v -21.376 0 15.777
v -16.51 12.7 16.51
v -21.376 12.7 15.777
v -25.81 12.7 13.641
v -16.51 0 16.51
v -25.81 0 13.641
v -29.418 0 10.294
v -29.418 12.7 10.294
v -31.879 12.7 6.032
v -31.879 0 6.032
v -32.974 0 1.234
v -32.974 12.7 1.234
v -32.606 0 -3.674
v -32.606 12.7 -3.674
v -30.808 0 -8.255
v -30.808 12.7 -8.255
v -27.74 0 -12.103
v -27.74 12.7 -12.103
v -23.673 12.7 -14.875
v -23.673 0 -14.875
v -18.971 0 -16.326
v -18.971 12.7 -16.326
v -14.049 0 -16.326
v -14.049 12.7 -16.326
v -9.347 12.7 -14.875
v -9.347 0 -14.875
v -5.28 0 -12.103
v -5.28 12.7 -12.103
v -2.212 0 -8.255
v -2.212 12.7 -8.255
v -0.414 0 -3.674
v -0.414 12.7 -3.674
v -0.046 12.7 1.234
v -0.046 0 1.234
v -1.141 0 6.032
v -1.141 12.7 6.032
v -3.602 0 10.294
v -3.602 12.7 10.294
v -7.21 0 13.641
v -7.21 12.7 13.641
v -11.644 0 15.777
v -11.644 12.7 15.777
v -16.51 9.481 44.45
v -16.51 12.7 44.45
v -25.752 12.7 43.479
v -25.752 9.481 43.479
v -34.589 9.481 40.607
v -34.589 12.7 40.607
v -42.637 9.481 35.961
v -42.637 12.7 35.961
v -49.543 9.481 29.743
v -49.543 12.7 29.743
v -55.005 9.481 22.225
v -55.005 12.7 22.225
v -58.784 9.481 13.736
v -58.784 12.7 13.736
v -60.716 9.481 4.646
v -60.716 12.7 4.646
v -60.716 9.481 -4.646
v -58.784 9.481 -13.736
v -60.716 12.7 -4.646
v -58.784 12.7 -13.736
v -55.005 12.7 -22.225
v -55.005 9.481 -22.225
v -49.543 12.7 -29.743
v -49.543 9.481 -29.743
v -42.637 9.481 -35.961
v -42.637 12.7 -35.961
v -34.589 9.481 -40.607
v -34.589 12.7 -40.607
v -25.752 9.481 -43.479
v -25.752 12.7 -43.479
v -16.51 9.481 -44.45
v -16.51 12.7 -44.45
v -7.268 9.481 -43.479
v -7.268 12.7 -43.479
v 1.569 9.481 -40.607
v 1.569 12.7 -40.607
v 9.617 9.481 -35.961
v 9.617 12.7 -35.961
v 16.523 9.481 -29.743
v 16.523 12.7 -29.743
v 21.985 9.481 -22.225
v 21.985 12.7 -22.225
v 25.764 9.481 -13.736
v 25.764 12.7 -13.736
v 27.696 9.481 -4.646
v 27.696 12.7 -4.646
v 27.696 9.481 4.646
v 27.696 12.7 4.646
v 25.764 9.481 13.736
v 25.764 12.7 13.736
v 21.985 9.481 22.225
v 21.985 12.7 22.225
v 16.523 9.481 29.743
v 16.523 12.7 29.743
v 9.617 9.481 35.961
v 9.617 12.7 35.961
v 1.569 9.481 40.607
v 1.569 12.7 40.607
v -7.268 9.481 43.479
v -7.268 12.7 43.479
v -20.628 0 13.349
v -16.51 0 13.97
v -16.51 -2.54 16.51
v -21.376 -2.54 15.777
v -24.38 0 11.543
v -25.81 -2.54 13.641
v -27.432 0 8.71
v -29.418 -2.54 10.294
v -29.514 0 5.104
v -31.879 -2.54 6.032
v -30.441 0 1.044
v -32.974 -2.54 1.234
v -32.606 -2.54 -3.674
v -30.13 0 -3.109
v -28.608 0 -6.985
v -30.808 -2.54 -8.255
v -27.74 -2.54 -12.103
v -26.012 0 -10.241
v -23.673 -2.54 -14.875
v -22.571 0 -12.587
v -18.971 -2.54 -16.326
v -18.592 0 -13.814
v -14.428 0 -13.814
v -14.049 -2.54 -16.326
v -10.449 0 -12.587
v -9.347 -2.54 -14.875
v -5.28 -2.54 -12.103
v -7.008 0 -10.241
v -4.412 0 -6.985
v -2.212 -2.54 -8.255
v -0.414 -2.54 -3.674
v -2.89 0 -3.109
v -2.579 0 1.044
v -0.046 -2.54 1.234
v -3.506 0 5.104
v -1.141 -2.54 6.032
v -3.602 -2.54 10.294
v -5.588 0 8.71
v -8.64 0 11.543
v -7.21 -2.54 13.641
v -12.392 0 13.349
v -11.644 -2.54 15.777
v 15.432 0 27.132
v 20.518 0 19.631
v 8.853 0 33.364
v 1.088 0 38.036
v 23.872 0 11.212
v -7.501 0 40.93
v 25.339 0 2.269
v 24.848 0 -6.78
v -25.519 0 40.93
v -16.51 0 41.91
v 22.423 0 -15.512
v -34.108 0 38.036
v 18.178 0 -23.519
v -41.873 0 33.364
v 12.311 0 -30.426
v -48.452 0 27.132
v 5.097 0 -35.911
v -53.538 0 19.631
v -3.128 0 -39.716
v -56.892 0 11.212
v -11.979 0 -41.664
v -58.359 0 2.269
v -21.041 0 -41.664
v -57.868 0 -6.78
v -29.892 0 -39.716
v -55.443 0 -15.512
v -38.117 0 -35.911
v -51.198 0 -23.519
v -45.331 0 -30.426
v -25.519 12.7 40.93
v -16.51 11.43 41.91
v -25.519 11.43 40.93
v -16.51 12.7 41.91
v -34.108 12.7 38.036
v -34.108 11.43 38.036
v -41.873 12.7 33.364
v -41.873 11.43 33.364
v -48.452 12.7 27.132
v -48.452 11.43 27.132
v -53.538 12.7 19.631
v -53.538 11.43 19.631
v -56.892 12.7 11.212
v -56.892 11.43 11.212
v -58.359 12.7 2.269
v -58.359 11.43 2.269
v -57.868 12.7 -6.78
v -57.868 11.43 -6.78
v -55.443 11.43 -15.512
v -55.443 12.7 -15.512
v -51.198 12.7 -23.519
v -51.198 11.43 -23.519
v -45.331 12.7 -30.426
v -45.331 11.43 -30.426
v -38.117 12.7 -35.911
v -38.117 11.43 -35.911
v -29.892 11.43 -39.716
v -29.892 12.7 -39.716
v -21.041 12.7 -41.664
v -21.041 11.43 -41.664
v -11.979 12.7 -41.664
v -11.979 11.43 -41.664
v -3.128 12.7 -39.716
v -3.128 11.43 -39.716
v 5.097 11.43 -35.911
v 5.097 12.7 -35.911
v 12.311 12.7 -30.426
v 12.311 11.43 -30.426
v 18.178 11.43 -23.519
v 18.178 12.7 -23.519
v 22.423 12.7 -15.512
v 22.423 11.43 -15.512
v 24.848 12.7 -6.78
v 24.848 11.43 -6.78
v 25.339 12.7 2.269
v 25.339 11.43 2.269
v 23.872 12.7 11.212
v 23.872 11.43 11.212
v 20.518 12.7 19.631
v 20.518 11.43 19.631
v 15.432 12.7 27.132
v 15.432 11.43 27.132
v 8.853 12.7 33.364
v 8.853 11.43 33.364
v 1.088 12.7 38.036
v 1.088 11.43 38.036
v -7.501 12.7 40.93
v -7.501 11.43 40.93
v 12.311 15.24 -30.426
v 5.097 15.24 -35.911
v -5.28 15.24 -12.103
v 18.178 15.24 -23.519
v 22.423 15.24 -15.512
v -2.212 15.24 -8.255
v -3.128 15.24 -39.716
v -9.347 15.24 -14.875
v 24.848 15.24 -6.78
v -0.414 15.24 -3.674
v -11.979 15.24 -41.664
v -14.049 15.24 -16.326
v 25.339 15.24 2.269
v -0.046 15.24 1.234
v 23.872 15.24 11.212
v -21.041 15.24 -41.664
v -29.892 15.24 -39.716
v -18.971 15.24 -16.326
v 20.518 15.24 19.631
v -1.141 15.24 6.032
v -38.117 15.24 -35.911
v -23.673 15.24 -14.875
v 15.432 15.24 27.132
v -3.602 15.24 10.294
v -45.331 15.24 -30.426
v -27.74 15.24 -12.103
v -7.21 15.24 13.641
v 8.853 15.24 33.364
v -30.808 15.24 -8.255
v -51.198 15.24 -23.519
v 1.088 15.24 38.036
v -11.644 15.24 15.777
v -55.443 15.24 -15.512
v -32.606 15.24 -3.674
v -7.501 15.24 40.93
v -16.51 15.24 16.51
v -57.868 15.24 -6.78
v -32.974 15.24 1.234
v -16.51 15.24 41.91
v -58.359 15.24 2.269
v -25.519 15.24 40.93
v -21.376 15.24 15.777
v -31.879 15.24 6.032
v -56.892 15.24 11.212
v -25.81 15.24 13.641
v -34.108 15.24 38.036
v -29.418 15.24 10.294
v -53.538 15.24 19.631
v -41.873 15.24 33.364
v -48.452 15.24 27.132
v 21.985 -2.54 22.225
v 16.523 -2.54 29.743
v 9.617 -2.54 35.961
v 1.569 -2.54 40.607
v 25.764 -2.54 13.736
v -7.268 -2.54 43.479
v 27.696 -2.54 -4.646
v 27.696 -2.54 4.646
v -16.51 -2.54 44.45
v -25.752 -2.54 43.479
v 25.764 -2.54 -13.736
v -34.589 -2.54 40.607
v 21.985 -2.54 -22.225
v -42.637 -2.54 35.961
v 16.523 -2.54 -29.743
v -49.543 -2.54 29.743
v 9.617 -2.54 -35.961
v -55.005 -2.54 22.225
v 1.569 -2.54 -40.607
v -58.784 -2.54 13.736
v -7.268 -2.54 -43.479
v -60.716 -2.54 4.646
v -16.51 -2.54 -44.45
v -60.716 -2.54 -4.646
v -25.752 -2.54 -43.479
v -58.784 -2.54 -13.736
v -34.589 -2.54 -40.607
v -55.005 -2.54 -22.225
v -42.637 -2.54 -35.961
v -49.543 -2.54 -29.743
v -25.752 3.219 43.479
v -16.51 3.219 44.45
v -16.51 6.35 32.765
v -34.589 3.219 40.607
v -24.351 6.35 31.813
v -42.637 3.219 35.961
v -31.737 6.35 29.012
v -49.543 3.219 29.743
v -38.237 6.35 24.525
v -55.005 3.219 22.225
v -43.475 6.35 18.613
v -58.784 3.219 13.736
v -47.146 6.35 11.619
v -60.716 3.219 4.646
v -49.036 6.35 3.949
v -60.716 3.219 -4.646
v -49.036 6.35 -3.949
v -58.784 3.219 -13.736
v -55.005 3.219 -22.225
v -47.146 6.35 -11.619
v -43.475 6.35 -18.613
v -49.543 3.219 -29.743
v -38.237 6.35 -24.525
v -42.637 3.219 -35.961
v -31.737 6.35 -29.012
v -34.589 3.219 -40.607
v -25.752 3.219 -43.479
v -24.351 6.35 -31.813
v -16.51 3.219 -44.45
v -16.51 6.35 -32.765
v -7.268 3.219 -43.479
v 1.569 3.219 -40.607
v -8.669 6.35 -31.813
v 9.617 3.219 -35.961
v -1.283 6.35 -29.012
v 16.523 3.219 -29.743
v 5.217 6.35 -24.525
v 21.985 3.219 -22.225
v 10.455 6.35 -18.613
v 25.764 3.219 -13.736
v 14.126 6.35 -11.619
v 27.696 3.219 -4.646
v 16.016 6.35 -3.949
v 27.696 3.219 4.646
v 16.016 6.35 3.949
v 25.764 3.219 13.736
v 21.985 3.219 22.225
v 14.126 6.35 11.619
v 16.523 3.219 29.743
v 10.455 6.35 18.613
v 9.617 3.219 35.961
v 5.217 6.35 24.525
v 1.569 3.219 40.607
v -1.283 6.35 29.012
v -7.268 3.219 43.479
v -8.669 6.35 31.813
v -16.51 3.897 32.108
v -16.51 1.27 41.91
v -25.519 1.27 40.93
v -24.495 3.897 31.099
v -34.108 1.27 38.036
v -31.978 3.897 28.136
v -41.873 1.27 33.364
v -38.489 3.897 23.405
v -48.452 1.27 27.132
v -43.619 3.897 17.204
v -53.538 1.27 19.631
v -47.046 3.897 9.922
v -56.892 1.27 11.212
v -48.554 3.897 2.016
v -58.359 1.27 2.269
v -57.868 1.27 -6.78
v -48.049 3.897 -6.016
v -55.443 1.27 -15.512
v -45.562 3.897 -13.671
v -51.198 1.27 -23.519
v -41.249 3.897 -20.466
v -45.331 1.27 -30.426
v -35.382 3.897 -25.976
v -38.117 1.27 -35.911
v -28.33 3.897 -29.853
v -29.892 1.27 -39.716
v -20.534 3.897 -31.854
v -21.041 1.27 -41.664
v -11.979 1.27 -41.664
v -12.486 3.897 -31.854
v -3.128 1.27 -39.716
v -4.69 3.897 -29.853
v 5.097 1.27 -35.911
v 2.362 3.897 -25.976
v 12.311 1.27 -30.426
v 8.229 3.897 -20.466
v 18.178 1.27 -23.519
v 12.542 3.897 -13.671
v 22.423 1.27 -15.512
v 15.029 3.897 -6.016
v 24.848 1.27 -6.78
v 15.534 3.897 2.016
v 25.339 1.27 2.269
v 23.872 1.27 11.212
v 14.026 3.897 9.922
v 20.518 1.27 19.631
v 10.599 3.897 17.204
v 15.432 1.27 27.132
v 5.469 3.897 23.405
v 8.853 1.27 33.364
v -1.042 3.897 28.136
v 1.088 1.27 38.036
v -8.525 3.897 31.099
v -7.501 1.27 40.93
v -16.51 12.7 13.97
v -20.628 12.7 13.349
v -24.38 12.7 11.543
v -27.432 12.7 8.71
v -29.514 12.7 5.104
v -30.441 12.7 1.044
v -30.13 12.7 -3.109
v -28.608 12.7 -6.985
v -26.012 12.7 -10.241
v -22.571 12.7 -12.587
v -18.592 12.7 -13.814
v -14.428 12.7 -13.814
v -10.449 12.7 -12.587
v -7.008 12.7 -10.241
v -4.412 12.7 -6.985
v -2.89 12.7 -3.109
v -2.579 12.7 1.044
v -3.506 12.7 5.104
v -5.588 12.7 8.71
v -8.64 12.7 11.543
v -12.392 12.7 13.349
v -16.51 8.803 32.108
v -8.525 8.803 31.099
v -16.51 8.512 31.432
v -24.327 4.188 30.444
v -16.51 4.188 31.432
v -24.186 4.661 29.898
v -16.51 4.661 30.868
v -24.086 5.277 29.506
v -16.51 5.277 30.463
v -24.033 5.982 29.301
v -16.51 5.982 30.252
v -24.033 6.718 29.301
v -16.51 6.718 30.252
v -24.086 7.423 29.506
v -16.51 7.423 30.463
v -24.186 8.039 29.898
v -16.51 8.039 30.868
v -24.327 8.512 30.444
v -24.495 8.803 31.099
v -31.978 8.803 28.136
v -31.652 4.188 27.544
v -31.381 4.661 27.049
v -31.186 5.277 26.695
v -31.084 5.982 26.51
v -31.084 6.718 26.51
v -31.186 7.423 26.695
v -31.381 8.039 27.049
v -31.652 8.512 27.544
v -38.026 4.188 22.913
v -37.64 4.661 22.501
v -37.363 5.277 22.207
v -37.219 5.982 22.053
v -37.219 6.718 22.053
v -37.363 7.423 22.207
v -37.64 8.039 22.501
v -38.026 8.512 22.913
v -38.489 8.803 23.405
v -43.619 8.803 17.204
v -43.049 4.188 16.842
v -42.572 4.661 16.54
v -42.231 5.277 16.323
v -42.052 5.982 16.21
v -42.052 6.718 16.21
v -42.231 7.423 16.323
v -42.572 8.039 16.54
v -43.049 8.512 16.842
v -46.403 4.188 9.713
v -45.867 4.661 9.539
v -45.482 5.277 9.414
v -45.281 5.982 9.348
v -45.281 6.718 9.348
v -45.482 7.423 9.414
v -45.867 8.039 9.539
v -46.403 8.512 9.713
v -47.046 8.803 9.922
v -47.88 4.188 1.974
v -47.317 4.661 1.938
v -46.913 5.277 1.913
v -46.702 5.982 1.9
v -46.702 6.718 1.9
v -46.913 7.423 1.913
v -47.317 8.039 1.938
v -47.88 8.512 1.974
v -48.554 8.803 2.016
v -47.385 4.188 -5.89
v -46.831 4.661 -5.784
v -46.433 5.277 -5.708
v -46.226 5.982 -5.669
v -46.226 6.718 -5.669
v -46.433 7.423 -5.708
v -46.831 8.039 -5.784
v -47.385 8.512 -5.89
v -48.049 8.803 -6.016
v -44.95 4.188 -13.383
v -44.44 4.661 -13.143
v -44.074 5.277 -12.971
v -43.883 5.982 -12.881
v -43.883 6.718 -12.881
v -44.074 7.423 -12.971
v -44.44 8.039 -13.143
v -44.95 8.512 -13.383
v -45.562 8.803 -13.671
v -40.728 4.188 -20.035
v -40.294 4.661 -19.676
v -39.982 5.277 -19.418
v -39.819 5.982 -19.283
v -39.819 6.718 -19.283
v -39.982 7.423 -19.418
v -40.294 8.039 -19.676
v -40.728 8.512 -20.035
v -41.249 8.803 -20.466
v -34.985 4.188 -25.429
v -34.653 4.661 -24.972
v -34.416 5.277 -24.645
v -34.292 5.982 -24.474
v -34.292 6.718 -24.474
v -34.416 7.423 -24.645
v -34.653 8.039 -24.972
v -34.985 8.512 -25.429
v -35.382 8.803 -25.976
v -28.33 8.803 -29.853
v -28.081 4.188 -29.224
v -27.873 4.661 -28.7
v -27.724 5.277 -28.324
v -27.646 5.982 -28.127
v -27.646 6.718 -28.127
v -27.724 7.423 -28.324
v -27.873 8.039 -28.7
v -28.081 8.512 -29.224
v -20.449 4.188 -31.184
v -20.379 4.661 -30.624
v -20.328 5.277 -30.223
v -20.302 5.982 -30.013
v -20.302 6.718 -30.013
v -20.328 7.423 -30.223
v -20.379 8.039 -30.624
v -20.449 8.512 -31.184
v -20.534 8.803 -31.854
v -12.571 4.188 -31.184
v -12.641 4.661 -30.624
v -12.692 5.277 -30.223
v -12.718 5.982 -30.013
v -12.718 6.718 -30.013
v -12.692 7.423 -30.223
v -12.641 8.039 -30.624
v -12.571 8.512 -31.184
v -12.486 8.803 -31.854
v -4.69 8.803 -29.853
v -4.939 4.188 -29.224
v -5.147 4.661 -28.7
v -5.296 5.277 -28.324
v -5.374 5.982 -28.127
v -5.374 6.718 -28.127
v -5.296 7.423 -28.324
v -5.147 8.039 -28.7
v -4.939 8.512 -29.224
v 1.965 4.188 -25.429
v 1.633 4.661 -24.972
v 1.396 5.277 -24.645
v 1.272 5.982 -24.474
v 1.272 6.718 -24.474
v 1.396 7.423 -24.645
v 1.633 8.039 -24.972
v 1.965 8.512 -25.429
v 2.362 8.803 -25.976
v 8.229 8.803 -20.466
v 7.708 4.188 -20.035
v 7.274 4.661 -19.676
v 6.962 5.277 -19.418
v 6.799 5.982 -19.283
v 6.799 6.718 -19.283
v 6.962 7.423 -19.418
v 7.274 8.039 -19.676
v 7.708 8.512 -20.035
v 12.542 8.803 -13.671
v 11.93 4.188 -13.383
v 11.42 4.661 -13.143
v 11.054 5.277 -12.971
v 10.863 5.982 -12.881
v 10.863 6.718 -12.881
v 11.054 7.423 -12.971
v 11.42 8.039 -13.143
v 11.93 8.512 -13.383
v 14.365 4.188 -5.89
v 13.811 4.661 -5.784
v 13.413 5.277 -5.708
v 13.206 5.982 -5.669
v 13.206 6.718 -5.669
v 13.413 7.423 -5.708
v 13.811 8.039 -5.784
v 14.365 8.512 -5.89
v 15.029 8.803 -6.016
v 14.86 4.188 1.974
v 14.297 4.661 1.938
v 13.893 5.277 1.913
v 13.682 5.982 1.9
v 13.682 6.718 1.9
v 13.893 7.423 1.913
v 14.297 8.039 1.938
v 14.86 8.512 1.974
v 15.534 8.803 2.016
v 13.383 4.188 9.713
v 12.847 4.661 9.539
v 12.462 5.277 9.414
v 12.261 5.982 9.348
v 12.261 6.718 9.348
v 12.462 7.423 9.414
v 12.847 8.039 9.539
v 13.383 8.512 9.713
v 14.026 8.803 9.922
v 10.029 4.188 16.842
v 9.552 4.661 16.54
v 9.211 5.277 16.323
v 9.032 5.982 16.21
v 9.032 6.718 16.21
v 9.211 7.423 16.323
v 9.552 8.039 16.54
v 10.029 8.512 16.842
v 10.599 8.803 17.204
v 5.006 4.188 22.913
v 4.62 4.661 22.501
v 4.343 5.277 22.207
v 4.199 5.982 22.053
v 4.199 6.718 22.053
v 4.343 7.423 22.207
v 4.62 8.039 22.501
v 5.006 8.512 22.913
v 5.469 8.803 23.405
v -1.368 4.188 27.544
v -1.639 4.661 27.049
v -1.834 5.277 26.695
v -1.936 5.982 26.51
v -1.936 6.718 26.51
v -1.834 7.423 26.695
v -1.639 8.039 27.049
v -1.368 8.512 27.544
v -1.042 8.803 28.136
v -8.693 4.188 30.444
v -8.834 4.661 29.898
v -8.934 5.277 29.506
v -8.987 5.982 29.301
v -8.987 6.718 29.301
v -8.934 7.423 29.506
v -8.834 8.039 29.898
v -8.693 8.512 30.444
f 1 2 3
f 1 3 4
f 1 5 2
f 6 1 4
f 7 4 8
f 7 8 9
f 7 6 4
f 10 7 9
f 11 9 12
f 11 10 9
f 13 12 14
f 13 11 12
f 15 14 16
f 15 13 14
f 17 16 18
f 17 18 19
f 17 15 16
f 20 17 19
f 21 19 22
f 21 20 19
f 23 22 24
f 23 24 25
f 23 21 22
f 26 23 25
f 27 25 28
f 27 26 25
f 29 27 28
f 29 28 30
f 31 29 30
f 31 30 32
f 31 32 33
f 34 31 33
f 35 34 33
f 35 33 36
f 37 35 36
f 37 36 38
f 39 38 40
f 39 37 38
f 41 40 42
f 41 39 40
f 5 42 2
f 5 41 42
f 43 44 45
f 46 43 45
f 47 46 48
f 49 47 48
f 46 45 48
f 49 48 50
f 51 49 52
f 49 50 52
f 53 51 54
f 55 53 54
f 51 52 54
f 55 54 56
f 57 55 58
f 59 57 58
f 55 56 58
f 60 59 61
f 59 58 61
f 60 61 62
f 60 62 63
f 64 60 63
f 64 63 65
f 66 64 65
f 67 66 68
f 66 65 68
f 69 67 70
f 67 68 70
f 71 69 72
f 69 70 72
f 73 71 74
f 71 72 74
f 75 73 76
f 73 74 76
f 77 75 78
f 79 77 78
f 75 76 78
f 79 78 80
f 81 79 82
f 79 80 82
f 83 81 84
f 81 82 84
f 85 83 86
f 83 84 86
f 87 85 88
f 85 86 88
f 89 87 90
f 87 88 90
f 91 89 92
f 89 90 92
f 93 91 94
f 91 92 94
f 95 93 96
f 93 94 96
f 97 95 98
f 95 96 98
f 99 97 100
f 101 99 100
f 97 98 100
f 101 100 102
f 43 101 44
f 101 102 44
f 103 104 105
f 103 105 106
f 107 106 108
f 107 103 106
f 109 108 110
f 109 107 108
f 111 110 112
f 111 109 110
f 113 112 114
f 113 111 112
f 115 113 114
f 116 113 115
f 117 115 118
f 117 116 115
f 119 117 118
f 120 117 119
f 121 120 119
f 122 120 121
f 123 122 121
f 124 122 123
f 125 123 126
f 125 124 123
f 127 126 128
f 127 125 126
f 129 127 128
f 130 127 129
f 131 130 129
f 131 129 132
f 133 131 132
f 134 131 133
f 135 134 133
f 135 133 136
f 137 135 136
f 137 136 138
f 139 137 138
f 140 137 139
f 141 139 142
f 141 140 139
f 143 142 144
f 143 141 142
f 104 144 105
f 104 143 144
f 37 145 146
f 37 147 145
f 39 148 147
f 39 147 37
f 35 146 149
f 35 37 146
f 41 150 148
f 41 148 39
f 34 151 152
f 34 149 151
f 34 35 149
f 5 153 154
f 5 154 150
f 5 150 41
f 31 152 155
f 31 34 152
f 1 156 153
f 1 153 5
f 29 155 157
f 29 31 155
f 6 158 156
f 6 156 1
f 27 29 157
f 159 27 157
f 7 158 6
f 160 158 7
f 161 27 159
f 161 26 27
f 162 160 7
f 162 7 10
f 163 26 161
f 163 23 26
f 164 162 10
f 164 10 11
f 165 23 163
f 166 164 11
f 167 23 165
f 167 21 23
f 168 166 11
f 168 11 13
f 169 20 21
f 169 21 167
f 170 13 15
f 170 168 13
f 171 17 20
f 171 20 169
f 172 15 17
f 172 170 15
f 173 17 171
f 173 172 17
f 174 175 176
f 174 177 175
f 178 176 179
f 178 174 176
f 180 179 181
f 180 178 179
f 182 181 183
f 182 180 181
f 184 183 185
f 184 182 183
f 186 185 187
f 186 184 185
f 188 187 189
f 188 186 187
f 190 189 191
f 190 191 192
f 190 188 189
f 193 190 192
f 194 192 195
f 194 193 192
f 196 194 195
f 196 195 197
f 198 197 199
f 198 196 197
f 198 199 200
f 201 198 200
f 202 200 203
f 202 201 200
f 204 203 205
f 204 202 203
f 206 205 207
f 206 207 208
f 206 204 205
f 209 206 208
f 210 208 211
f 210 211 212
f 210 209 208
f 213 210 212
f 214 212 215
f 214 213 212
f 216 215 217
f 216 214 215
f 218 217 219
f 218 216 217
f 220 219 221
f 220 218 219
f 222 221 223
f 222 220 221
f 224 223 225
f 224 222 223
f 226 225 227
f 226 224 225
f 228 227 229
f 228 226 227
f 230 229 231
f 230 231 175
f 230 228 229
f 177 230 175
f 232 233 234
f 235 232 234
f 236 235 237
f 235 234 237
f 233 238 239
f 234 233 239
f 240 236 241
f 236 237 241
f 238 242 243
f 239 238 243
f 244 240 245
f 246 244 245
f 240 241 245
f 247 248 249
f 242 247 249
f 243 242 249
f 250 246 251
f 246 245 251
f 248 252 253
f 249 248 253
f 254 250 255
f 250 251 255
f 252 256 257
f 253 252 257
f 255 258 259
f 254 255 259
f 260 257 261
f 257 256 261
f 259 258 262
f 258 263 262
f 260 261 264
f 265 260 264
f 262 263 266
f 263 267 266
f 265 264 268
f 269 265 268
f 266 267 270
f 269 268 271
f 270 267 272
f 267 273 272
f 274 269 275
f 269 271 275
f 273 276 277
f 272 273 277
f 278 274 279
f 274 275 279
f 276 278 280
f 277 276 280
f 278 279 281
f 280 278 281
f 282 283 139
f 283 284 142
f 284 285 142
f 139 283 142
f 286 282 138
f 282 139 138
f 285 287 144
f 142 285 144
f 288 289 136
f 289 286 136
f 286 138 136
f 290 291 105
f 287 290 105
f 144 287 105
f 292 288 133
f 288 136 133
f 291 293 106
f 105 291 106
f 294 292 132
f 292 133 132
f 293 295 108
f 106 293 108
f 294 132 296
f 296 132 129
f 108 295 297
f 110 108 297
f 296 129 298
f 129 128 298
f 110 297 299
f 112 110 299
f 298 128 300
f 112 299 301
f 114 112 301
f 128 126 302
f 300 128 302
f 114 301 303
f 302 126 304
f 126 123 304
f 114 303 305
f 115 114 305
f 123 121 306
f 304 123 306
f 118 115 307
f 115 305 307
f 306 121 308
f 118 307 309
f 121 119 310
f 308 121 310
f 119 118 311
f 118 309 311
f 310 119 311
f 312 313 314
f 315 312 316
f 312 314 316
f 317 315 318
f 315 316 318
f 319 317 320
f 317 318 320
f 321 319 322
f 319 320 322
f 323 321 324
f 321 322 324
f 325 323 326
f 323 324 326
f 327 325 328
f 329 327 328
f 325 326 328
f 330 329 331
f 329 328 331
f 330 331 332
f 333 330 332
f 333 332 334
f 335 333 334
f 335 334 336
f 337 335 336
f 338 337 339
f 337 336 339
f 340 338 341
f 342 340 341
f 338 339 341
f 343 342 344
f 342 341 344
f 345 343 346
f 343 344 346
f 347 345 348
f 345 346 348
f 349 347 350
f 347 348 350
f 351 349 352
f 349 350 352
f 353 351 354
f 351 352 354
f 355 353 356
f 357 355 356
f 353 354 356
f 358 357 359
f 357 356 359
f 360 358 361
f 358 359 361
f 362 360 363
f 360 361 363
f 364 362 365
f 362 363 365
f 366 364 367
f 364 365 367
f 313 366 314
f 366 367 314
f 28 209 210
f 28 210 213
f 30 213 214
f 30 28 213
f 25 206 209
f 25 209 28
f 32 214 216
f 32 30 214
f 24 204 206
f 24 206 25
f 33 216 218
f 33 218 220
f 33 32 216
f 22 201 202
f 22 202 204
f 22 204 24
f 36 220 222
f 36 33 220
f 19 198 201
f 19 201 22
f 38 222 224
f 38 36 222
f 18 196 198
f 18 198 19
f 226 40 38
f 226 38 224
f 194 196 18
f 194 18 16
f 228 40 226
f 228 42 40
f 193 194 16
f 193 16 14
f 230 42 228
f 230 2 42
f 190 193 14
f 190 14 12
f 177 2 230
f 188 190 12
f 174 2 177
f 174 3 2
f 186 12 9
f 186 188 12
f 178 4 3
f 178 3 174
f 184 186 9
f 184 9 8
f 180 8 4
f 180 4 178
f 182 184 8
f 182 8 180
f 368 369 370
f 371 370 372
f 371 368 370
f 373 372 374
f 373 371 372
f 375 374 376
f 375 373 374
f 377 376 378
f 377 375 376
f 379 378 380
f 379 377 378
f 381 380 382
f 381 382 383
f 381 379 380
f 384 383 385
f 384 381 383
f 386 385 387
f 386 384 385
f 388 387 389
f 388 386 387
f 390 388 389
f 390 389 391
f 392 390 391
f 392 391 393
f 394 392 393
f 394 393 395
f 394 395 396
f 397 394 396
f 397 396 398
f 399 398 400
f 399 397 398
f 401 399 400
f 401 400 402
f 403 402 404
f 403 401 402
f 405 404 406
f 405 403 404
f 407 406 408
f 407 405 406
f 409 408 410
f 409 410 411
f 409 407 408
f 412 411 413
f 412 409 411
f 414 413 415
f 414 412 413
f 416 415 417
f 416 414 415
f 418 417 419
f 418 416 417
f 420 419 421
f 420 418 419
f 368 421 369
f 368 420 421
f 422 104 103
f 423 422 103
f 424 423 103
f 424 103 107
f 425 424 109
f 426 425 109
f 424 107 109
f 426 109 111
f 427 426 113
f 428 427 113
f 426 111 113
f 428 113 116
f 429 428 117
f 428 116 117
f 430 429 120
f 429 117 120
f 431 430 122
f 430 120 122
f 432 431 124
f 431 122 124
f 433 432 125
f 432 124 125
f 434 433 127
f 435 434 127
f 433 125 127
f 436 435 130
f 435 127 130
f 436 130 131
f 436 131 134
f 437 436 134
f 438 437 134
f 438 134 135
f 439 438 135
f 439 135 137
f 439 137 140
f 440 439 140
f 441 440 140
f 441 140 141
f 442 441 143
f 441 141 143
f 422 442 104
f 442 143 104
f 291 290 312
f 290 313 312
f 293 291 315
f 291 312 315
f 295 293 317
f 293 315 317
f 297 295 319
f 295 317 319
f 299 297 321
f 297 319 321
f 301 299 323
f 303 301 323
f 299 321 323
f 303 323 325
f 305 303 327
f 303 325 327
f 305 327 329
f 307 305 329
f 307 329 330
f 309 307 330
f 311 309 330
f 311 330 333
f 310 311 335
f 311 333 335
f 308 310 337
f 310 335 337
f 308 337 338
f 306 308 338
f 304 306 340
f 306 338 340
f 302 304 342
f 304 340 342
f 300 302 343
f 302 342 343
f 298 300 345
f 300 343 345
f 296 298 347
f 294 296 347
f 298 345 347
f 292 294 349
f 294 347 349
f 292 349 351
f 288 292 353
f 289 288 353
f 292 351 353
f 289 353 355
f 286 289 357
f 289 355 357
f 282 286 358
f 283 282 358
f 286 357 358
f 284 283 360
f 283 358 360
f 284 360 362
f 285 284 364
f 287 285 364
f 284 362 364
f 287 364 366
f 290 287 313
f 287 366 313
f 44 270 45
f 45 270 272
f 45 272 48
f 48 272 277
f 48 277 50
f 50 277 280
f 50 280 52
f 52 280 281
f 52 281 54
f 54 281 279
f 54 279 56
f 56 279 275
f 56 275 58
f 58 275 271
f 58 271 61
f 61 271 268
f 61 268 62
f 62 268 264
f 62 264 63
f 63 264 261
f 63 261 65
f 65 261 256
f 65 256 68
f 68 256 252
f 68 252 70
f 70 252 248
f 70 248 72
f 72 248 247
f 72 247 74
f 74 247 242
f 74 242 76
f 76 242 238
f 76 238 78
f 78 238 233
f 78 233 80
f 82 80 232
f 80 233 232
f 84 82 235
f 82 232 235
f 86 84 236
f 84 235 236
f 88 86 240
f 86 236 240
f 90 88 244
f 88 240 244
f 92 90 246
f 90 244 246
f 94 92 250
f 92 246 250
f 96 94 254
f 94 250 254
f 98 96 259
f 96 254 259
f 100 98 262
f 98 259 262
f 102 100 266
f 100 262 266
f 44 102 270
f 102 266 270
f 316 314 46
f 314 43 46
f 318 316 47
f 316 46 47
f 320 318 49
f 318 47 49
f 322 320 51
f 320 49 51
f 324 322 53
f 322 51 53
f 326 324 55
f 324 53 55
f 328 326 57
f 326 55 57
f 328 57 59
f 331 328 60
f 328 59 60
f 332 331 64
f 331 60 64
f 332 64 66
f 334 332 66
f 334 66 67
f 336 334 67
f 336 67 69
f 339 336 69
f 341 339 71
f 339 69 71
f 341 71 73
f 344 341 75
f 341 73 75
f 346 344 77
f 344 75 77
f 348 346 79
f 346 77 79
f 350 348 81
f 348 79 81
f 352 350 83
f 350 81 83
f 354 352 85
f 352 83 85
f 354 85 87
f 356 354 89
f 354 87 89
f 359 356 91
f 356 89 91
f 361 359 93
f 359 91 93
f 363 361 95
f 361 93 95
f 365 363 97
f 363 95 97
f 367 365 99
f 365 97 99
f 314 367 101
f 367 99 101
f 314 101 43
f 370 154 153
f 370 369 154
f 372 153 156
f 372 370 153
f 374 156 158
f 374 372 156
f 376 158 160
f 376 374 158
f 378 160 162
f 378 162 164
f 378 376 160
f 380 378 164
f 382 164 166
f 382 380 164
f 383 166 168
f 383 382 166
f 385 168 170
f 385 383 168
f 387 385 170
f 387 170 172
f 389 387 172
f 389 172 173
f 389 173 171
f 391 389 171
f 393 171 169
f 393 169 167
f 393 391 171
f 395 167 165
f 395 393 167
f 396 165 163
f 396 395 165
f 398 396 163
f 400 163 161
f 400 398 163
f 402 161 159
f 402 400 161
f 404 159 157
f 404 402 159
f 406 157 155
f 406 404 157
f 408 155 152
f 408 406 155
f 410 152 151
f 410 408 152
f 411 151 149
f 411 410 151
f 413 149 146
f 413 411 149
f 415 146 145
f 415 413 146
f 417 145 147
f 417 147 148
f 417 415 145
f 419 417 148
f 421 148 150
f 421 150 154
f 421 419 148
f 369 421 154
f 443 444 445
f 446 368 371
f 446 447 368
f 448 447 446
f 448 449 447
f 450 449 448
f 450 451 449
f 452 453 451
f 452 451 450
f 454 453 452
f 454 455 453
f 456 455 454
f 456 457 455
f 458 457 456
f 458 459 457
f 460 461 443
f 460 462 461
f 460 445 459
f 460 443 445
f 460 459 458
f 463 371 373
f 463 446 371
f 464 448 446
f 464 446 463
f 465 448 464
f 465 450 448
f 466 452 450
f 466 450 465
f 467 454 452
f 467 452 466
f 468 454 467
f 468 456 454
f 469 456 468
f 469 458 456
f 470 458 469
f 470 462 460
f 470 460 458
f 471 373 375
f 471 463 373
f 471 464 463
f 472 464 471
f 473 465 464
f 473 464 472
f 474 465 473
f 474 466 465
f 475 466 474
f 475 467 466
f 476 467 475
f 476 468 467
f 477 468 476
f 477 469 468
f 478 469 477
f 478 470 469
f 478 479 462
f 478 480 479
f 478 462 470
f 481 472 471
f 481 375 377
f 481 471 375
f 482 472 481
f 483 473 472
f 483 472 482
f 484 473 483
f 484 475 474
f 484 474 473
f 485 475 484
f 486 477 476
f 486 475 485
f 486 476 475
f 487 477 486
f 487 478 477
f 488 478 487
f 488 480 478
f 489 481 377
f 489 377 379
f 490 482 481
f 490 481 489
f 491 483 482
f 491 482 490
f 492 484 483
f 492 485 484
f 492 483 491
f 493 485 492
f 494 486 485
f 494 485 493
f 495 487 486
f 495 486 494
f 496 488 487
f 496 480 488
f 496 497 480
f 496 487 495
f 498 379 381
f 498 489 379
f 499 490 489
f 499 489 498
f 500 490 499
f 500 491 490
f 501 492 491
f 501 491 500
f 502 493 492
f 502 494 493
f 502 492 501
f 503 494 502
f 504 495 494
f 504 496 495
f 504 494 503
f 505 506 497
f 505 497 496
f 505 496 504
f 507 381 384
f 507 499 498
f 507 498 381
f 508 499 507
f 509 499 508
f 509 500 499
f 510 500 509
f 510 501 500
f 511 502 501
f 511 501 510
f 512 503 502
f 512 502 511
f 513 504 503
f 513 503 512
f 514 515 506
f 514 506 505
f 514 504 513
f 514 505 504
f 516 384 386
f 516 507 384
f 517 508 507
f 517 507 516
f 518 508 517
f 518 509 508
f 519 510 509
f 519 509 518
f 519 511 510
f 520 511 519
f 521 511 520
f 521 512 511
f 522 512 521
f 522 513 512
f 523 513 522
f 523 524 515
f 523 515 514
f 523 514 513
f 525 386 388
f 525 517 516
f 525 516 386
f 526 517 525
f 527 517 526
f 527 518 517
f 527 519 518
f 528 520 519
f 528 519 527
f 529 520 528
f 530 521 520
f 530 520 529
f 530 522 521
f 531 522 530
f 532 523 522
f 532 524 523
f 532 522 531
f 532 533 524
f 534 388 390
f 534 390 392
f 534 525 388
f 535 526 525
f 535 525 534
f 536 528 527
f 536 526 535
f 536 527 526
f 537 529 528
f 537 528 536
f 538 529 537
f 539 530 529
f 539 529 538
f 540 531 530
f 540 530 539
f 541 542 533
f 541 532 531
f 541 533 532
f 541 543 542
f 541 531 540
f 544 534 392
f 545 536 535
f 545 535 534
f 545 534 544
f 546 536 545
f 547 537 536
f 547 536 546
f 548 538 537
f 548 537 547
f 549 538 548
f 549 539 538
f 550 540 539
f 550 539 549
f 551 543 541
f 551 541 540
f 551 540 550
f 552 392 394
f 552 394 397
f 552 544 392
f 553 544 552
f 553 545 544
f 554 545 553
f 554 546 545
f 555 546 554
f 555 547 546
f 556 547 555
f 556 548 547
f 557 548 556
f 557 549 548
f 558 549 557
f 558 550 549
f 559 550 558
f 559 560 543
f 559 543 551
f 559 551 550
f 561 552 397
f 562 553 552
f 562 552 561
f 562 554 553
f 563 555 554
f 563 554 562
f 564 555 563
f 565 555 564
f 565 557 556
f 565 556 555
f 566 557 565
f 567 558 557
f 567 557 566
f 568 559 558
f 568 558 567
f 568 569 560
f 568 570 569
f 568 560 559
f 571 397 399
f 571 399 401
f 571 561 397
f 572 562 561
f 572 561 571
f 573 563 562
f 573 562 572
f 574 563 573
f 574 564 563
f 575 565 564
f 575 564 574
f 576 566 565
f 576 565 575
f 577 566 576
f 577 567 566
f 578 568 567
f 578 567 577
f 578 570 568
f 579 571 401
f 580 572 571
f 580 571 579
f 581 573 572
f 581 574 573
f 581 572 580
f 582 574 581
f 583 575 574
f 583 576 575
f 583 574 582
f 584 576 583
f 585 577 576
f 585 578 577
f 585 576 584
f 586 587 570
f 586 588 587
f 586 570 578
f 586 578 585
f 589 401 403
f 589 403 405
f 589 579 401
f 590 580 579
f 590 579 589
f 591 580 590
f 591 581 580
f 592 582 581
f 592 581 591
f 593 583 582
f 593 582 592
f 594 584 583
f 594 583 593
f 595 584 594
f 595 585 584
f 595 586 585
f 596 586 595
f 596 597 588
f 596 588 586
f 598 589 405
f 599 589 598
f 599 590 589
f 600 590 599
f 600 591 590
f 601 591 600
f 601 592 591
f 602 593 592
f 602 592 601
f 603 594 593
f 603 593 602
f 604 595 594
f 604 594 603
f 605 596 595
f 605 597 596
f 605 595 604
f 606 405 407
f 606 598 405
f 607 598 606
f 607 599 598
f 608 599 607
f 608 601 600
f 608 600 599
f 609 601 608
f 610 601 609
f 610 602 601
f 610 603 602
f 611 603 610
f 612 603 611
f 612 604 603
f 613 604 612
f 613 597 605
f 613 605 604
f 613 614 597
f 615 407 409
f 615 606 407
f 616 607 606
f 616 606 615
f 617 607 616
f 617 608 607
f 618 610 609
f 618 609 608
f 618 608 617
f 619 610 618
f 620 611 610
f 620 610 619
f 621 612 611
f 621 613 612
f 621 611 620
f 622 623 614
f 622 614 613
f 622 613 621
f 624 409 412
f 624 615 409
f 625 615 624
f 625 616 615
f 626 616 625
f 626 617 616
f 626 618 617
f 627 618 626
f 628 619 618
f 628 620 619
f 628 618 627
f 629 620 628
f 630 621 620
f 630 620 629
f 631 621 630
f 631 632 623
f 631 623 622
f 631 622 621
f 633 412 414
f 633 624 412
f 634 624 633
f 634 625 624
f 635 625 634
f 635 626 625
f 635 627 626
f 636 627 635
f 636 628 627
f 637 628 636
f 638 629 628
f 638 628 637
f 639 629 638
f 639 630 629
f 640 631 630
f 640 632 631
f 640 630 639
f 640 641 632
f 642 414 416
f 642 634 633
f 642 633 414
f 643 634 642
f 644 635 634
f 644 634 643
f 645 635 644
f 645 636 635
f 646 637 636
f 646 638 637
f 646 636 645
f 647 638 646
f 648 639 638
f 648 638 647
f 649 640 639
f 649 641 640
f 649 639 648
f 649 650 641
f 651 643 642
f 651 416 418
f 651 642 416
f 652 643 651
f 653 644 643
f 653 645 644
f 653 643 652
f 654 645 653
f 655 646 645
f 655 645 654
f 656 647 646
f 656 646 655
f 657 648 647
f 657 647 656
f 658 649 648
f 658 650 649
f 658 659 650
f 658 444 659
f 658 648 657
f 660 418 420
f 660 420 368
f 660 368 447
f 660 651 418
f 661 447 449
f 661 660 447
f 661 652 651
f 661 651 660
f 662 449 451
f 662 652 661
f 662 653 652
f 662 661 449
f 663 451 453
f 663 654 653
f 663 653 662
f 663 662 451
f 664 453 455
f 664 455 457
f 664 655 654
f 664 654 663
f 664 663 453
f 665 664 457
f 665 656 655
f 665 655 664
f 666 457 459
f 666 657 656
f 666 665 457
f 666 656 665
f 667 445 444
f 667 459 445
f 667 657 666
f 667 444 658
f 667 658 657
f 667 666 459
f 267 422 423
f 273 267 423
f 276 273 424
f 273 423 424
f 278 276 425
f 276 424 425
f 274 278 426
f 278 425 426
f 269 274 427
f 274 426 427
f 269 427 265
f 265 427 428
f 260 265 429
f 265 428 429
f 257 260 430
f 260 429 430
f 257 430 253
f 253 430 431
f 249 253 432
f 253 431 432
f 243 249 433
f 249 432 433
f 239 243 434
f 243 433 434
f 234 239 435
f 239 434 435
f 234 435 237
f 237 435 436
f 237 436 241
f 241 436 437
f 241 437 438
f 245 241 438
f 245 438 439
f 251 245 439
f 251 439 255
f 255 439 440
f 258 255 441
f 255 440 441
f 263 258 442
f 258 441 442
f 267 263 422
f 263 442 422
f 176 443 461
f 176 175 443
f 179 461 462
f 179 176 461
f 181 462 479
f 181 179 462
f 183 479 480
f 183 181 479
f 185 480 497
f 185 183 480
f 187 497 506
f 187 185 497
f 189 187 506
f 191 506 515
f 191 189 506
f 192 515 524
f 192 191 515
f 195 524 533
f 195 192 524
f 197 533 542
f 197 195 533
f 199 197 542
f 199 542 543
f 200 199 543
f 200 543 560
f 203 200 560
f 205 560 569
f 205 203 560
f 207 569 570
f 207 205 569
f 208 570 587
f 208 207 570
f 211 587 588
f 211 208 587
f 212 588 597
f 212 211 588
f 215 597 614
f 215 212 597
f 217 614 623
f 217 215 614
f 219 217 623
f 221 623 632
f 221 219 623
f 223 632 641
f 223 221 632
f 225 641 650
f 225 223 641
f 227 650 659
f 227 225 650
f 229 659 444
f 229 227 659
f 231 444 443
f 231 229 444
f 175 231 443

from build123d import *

# Parameters (mm, degrees)
CHAMFER2_SIZE = 2.54


with BuildPart() as part:
    # Sketch1 → Revolve-Thin2 (revolve)
    with BuildSketch(Plane.XY, mode=Mode.PRIVATE) as revolve_thin2_sk:
        Polygon((16.254988293, 6.35), (27.94, 9.480989451), (27.94, 15.24), (-2.54, 15.24), (-2.54, -2.54), (27.94, -2.54), (27.94, 3.219010549), align=None)
        with BuildLine():
            Line((15.597587918, 8.803451599), (25.4, 11.43))
            Line((25.4, 11.43), (25.4, 12.7))
            Line((25.4, 12.7), (0, 12.7))
            Line((0, 12.7), (0, 0))
            Line((0, 0), (25.4, 0))
            Line((25.4, 0), (25.4, 1.27))
            Line((25.4, 1.27), (15.597587918, 3.896548401))
            ThreePointArc((15.597587918, 3.896548401), (13.714988293, 6.35), (15.597587918, 8.803451599))
        make_face(mode=Mode.SUBTRACT)
    revolve(revolve_thin2_sk.sketch.rotate(Axis((-16.51, 12.7, 0), (0, -1, 0)), 90), axis=Axis((-16.51, 12.7, 0), (0, -1, 0)))

    # Chamfer2
    chamfer2_edges = [part.edges().sort_by_distance(p)[0] for p in [
        (-16.51, -2.54, -13.97),
        (-16.51, 15.24, -13.97),
        (-16.51, 15.24, -44.45),
    ]]
    chamfer(chamfer2_edges, length=CHAMFER2_SIZE)


solid = part.part
